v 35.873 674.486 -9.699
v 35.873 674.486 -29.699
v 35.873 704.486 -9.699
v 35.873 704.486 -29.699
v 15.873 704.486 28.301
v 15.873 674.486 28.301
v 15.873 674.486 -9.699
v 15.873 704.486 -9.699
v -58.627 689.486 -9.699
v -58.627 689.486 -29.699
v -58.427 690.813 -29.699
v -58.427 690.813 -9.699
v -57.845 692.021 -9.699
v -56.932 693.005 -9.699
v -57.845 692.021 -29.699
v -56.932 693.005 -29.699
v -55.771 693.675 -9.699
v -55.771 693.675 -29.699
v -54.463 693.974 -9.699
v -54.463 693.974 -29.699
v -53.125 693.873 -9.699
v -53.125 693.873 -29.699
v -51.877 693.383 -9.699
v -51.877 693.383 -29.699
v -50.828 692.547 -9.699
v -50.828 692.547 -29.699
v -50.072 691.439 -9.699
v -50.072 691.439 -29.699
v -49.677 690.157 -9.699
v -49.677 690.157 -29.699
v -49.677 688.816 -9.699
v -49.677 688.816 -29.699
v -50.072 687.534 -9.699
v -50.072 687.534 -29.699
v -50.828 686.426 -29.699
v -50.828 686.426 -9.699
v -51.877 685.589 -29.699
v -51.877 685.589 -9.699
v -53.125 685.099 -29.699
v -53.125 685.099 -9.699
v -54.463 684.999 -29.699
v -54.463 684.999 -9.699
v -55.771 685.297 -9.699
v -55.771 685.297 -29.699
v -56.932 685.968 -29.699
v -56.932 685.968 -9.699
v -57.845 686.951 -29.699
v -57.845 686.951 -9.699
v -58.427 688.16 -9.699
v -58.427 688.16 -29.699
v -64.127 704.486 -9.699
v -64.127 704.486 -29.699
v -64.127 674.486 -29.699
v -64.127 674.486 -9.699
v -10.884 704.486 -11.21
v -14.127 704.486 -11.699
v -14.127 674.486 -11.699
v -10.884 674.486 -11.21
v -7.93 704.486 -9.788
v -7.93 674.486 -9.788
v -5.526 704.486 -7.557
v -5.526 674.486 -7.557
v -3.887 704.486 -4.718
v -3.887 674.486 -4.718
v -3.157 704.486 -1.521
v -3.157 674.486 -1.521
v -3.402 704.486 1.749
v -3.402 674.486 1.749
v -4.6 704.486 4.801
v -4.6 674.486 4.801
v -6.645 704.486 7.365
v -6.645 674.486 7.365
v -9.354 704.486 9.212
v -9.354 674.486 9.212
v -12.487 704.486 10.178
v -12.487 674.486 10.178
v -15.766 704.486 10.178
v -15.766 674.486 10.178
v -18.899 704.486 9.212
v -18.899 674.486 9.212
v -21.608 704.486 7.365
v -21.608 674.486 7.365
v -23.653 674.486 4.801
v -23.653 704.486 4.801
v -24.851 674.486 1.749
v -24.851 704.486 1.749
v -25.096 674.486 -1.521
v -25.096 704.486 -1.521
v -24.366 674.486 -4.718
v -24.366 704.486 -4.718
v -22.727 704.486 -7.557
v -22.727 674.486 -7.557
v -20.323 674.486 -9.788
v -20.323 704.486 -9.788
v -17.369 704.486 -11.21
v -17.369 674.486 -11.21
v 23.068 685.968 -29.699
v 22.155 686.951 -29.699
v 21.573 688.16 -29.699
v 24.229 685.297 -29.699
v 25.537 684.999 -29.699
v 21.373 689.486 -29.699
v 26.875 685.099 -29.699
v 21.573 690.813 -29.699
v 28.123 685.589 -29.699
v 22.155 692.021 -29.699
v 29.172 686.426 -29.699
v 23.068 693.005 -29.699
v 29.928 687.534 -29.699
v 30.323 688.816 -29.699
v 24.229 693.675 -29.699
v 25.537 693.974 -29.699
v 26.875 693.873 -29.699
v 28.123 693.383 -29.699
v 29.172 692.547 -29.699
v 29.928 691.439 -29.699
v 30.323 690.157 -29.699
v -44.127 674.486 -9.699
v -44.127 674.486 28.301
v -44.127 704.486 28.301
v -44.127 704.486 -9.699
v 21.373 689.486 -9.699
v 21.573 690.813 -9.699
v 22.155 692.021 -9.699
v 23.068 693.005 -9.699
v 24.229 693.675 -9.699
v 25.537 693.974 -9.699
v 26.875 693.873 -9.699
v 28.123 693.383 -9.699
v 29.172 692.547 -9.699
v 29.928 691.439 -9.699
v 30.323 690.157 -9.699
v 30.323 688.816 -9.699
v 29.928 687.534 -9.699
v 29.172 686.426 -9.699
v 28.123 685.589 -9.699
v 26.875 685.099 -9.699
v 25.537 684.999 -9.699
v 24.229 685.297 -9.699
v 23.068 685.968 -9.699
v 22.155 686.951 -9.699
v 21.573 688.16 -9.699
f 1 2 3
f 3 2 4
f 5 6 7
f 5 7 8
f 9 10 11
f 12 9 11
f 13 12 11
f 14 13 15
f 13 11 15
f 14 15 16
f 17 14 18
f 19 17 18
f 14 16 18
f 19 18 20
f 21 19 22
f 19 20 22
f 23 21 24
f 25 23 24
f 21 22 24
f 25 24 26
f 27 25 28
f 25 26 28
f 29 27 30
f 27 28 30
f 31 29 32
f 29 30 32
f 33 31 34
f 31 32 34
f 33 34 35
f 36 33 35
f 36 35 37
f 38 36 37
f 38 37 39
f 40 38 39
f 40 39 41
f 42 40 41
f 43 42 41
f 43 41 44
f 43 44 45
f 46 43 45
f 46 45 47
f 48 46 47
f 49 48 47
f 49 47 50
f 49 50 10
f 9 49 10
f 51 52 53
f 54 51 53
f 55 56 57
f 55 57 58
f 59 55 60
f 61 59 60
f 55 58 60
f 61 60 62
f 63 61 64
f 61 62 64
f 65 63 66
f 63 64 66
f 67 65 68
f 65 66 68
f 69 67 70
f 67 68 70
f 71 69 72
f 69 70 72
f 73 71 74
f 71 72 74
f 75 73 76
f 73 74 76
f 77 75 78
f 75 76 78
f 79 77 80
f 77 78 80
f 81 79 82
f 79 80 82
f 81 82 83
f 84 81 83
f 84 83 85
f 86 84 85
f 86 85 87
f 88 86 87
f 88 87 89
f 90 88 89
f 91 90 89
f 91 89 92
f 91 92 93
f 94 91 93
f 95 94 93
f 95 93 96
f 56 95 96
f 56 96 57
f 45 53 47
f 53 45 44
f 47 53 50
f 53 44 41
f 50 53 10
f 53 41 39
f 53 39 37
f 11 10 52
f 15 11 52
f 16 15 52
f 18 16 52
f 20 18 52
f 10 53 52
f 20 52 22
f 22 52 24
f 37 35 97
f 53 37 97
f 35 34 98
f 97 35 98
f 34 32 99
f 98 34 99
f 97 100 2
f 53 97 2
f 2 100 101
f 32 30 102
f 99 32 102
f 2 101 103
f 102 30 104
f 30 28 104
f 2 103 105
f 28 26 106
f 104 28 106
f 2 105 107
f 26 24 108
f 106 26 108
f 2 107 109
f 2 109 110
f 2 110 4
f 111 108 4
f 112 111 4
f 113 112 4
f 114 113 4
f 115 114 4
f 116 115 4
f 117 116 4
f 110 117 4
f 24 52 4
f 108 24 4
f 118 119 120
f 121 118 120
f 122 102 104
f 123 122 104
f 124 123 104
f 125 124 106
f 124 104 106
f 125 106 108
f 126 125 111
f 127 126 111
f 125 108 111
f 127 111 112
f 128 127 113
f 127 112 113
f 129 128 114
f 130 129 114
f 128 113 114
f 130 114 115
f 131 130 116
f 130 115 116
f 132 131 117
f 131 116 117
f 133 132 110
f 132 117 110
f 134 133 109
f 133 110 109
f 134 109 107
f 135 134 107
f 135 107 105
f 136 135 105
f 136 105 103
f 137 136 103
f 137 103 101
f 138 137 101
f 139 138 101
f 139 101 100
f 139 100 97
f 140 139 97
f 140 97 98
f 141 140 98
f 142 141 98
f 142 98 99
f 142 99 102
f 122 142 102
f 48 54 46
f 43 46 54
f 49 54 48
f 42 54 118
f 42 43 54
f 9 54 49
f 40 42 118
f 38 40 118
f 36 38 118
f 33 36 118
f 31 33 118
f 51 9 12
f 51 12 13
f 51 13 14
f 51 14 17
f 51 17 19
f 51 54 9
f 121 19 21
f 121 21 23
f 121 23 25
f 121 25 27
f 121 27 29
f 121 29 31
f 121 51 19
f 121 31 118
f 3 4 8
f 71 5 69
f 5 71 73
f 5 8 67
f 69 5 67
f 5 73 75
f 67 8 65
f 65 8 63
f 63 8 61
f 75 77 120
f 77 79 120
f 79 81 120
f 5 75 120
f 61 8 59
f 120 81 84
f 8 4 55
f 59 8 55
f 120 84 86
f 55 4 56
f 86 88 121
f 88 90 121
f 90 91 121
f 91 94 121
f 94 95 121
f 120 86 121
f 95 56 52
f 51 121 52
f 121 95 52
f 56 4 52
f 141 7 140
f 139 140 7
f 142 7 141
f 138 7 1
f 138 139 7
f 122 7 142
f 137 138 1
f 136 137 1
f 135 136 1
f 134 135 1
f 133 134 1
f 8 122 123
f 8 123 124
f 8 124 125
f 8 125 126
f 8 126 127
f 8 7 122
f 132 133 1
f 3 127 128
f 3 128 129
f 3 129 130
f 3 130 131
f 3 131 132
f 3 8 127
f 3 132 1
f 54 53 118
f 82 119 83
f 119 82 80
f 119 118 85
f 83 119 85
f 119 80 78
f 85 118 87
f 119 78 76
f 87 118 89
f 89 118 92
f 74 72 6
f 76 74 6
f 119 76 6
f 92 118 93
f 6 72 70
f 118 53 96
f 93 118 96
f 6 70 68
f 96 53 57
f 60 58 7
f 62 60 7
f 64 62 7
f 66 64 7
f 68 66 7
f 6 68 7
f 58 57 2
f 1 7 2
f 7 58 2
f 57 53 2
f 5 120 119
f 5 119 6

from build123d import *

# Parameters (mm, degrees)
BOSS_EXTRUDE1_DEPTH  = 58
SKETCH3_R            = 11
CUT_EXTRUDE1_DEPTH   = 77.774006375
SKETCH4_W            = 20
SKETCH4_H            = 30
CUT_EXTRUDE2_DEPTH   = 38
M8_CLEARANCE_HOLE1_D = 9


with BuildPart() as part:
    # Sketch1 → Boss-Extrude1 (new body)
    with BuildSketch(Plane(origin=(0, 2.518676762, -29.699029015), x_dir=(1, 0, 0), z_dir=(0, 0, 1))):
        Polygon((-64.126560257, 671.967635092), (-14.126560257, 671.967635092), (35.873439743, 671.967635092), (35.873439743, 701.967635092), (-64.126560257, 701.967635092), align=None)
    extrude(amount=BOSS_EXTRUDE1_DEPTH)

    # Sketch3 → Cut-Extrude1 (cut, through all)
    with BuildSketch(Plane.XZ.offset(-674.486311854)):
        with Locations(Location((-14.126560257, -0.699029015, 0), (0, 0, 270))):
            Circle(SKETCH3_R)
    extrude(amount=-CUT_EXTRUDE1_DEPTH, mode=Mode.SUBTRACT)

    # Sketch4 → Cut-Extrude2 (cut)
    with BuildSketch(Plane.XY.offset(28.300970985)):
        with Locations((-54.126560257, 689.486311854)):
            Rectangle(SKETCH4_W, SKETCH4_H)
        with Locations((25.873439743, 689.486311854)):
            Rectangle(SKETCH4_W, SKETCH4_H)
    extrude(amount=-CUT_EXTRUDE2_DEPTH, mode=Mode.SUBTRACT)

    # M8 Clearance Hole1 (through all)
    with Locations(Plane(origin=(-5.422124321, 631.407959219, -9.699029015), x_dir=(1, 0, 0), z_dir=(0, 0, 1))):
        with Locations((-48.704435936, -458.836111538), (-48.704435936, -493.836111538), (31.295564064, -458.836111538), (31.295564064, -493.836111538), (-48.704435936, 58.078352635), (31.295564064, 58.078352635)):
            Hole(M8_CLEARANCE_HOLE1_D / 2)


solid = part.part
